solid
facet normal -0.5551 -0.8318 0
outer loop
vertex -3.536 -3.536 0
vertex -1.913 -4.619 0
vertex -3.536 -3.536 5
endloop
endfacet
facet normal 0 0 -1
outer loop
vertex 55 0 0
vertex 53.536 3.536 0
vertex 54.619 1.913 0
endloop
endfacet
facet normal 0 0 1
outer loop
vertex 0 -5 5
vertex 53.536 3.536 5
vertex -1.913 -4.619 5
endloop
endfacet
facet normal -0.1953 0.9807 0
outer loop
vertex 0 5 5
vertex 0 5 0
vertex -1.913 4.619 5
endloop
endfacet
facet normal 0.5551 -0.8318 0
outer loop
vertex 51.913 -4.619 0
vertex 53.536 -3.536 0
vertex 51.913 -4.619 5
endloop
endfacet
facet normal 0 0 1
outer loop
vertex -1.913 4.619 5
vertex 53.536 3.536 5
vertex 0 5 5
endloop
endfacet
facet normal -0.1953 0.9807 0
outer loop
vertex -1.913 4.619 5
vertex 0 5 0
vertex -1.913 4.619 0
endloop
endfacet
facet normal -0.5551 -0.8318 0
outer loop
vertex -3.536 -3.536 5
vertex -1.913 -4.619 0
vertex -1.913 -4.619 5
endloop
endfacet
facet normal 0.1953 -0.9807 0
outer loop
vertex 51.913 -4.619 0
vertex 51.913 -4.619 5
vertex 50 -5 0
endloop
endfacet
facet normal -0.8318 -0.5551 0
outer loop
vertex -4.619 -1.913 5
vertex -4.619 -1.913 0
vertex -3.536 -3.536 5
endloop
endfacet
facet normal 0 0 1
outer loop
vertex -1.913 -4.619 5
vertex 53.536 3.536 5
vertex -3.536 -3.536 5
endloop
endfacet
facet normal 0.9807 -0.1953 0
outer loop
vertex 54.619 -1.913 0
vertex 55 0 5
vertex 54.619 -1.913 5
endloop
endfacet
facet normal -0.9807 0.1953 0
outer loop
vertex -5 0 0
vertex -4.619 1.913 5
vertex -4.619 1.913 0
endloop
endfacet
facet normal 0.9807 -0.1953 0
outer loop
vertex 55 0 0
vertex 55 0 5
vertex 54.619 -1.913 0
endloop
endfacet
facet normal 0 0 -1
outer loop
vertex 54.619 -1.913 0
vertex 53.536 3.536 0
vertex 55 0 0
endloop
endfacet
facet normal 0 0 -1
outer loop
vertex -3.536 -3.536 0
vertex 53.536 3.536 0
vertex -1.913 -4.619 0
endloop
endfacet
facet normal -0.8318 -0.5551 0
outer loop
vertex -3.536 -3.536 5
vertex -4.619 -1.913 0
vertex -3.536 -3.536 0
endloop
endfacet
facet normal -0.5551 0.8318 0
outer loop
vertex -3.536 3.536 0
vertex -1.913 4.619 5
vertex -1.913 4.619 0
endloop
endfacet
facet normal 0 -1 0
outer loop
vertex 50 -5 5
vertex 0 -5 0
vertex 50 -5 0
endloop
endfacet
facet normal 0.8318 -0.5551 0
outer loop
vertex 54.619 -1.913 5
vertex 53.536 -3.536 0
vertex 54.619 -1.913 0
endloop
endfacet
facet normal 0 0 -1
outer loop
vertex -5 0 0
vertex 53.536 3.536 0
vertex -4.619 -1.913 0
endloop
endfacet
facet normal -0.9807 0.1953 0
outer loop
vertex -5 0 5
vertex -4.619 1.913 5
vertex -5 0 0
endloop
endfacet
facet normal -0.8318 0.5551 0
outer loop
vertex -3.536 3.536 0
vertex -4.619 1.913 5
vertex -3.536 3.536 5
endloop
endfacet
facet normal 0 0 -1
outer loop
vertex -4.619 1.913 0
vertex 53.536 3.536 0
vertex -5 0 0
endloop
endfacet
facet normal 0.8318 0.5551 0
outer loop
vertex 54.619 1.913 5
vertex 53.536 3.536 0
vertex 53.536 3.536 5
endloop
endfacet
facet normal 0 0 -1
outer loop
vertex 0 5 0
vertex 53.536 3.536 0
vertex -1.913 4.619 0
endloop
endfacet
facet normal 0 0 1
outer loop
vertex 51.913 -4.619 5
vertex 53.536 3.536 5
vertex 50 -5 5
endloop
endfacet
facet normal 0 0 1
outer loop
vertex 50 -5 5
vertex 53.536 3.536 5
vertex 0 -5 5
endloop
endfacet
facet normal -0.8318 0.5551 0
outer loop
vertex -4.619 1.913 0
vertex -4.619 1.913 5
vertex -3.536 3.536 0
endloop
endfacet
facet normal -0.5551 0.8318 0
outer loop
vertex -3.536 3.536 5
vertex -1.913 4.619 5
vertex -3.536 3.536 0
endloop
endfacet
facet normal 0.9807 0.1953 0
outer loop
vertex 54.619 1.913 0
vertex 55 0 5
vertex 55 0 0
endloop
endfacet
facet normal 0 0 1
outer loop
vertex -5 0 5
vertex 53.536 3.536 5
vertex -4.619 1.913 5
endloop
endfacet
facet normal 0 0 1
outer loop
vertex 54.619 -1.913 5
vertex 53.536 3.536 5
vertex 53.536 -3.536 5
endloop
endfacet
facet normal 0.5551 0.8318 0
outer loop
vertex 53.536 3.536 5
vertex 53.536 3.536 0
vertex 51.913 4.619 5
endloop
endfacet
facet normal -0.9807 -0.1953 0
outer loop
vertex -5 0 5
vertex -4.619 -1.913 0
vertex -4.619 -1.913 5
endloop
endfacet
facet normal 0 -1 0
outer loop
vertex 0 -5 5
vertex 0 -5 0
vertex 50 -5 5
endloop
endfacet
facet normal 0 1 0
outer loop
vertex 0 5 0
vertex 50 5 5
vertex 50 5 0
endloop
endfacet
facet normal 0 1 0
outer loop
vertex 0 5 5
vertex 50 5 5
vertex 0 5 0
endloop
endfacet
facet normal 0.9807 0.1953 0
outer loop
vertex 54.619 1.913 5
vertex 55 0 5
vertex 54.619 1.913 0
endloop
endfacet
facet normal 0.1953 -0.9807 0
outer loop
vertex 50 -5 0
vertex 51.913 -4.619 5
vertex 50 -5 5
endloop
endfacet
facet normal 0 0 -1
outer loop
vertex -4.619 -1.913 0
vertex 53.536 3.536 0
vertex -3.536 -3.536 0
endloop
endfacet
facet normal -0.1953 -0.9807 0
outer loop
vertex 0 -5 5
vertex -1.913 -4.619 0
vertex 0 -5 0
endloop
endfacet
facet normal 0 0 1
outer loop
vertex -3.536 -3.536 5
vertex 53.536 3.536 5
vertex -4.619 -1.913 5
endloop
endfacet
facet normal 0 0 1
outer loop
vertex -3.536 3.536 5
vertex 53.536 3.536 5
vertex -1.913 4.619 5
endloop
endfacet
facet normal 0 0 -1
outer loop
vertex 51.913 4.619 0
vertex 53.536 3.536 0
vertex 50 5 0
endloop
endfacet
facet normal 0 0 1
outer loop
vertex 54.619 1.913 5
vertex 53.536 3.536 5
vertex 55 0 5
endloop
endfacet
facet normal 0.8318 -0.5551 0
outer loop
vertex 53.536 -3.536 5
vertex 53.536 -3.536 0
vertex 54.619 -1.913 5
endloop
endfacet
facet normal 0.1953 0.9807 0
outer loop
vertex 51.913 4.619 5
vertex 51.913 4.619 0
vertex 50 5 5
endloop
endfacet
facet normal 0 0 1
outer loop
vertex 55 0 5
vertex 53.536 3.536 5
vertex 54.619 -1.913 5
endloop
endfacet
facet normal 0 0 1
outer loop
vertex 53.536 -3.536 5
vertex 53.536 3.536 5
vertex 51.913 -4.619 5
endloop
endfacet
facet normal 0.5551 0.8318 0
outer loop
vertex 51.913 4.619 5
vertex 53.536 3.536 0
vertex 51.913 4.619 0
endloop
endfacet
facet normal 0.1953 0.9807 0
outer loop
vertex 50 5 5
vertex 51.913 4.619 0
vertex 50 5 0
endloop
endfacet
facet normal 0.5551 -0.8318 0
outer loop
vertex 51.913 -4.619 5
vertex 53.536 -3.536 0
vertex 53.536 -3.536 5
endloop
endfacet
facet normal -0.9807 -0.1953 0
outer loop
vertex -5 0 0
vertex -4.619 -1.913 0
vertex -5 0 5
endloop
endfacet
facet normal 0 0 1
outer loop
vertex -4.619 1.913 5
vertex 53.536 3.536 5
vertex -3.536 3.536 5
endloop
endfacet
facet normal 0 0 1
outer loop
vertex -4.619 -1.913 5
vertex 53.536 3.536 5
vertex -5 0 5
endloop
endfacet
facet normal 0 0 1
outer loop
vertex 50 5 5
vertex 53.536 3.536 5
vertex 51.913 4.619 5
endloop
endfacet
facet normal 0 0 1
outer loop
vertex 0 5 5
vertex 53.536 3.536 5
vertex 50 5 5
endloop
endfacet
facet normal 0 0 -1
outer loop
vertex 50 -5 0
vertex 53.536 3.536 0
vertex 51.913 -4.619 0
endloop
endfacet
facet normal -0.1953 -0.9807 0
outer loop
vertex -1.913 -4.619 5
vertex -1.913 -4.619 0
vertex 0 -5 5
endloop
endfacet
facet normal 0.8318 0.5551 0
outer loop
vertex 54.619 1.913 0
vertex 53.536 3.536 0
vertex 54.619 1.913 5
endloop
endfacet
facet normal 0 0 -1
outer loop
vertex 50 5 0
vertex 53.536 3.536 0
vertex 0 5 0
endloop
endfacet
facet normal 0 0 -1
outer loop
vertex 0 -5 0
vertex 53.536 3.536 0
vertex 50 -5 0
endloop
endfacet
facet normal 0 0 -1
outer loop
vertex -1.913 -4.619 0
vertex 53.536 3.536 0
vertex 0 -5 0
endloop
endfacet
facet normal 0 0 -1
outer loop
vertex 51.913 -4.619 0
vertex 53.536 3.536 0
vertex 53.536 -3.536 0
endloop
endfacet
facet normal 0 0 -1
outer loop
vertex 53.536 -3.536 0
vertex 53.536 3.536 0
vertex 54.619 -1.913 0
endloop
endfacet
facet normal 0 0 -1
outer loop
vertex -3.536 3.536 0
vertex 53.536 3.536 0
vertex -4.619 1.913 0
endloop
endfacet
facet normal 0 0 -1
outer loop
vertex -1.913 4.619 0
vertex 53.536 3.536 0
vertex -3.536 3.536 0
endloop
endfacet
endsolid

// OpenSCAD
$height = 5;
$outer_radius = 5;
$distance = 50;

$hole_radius = 2.5;
$hole_thickness = 3;


difference(){
    hull(){
        cylinder($height,$outer_radius,$outer_radius);
        translate([$distance,0,0]) cylinder($height,$outer_radius,$outer_radius);
    }
}
